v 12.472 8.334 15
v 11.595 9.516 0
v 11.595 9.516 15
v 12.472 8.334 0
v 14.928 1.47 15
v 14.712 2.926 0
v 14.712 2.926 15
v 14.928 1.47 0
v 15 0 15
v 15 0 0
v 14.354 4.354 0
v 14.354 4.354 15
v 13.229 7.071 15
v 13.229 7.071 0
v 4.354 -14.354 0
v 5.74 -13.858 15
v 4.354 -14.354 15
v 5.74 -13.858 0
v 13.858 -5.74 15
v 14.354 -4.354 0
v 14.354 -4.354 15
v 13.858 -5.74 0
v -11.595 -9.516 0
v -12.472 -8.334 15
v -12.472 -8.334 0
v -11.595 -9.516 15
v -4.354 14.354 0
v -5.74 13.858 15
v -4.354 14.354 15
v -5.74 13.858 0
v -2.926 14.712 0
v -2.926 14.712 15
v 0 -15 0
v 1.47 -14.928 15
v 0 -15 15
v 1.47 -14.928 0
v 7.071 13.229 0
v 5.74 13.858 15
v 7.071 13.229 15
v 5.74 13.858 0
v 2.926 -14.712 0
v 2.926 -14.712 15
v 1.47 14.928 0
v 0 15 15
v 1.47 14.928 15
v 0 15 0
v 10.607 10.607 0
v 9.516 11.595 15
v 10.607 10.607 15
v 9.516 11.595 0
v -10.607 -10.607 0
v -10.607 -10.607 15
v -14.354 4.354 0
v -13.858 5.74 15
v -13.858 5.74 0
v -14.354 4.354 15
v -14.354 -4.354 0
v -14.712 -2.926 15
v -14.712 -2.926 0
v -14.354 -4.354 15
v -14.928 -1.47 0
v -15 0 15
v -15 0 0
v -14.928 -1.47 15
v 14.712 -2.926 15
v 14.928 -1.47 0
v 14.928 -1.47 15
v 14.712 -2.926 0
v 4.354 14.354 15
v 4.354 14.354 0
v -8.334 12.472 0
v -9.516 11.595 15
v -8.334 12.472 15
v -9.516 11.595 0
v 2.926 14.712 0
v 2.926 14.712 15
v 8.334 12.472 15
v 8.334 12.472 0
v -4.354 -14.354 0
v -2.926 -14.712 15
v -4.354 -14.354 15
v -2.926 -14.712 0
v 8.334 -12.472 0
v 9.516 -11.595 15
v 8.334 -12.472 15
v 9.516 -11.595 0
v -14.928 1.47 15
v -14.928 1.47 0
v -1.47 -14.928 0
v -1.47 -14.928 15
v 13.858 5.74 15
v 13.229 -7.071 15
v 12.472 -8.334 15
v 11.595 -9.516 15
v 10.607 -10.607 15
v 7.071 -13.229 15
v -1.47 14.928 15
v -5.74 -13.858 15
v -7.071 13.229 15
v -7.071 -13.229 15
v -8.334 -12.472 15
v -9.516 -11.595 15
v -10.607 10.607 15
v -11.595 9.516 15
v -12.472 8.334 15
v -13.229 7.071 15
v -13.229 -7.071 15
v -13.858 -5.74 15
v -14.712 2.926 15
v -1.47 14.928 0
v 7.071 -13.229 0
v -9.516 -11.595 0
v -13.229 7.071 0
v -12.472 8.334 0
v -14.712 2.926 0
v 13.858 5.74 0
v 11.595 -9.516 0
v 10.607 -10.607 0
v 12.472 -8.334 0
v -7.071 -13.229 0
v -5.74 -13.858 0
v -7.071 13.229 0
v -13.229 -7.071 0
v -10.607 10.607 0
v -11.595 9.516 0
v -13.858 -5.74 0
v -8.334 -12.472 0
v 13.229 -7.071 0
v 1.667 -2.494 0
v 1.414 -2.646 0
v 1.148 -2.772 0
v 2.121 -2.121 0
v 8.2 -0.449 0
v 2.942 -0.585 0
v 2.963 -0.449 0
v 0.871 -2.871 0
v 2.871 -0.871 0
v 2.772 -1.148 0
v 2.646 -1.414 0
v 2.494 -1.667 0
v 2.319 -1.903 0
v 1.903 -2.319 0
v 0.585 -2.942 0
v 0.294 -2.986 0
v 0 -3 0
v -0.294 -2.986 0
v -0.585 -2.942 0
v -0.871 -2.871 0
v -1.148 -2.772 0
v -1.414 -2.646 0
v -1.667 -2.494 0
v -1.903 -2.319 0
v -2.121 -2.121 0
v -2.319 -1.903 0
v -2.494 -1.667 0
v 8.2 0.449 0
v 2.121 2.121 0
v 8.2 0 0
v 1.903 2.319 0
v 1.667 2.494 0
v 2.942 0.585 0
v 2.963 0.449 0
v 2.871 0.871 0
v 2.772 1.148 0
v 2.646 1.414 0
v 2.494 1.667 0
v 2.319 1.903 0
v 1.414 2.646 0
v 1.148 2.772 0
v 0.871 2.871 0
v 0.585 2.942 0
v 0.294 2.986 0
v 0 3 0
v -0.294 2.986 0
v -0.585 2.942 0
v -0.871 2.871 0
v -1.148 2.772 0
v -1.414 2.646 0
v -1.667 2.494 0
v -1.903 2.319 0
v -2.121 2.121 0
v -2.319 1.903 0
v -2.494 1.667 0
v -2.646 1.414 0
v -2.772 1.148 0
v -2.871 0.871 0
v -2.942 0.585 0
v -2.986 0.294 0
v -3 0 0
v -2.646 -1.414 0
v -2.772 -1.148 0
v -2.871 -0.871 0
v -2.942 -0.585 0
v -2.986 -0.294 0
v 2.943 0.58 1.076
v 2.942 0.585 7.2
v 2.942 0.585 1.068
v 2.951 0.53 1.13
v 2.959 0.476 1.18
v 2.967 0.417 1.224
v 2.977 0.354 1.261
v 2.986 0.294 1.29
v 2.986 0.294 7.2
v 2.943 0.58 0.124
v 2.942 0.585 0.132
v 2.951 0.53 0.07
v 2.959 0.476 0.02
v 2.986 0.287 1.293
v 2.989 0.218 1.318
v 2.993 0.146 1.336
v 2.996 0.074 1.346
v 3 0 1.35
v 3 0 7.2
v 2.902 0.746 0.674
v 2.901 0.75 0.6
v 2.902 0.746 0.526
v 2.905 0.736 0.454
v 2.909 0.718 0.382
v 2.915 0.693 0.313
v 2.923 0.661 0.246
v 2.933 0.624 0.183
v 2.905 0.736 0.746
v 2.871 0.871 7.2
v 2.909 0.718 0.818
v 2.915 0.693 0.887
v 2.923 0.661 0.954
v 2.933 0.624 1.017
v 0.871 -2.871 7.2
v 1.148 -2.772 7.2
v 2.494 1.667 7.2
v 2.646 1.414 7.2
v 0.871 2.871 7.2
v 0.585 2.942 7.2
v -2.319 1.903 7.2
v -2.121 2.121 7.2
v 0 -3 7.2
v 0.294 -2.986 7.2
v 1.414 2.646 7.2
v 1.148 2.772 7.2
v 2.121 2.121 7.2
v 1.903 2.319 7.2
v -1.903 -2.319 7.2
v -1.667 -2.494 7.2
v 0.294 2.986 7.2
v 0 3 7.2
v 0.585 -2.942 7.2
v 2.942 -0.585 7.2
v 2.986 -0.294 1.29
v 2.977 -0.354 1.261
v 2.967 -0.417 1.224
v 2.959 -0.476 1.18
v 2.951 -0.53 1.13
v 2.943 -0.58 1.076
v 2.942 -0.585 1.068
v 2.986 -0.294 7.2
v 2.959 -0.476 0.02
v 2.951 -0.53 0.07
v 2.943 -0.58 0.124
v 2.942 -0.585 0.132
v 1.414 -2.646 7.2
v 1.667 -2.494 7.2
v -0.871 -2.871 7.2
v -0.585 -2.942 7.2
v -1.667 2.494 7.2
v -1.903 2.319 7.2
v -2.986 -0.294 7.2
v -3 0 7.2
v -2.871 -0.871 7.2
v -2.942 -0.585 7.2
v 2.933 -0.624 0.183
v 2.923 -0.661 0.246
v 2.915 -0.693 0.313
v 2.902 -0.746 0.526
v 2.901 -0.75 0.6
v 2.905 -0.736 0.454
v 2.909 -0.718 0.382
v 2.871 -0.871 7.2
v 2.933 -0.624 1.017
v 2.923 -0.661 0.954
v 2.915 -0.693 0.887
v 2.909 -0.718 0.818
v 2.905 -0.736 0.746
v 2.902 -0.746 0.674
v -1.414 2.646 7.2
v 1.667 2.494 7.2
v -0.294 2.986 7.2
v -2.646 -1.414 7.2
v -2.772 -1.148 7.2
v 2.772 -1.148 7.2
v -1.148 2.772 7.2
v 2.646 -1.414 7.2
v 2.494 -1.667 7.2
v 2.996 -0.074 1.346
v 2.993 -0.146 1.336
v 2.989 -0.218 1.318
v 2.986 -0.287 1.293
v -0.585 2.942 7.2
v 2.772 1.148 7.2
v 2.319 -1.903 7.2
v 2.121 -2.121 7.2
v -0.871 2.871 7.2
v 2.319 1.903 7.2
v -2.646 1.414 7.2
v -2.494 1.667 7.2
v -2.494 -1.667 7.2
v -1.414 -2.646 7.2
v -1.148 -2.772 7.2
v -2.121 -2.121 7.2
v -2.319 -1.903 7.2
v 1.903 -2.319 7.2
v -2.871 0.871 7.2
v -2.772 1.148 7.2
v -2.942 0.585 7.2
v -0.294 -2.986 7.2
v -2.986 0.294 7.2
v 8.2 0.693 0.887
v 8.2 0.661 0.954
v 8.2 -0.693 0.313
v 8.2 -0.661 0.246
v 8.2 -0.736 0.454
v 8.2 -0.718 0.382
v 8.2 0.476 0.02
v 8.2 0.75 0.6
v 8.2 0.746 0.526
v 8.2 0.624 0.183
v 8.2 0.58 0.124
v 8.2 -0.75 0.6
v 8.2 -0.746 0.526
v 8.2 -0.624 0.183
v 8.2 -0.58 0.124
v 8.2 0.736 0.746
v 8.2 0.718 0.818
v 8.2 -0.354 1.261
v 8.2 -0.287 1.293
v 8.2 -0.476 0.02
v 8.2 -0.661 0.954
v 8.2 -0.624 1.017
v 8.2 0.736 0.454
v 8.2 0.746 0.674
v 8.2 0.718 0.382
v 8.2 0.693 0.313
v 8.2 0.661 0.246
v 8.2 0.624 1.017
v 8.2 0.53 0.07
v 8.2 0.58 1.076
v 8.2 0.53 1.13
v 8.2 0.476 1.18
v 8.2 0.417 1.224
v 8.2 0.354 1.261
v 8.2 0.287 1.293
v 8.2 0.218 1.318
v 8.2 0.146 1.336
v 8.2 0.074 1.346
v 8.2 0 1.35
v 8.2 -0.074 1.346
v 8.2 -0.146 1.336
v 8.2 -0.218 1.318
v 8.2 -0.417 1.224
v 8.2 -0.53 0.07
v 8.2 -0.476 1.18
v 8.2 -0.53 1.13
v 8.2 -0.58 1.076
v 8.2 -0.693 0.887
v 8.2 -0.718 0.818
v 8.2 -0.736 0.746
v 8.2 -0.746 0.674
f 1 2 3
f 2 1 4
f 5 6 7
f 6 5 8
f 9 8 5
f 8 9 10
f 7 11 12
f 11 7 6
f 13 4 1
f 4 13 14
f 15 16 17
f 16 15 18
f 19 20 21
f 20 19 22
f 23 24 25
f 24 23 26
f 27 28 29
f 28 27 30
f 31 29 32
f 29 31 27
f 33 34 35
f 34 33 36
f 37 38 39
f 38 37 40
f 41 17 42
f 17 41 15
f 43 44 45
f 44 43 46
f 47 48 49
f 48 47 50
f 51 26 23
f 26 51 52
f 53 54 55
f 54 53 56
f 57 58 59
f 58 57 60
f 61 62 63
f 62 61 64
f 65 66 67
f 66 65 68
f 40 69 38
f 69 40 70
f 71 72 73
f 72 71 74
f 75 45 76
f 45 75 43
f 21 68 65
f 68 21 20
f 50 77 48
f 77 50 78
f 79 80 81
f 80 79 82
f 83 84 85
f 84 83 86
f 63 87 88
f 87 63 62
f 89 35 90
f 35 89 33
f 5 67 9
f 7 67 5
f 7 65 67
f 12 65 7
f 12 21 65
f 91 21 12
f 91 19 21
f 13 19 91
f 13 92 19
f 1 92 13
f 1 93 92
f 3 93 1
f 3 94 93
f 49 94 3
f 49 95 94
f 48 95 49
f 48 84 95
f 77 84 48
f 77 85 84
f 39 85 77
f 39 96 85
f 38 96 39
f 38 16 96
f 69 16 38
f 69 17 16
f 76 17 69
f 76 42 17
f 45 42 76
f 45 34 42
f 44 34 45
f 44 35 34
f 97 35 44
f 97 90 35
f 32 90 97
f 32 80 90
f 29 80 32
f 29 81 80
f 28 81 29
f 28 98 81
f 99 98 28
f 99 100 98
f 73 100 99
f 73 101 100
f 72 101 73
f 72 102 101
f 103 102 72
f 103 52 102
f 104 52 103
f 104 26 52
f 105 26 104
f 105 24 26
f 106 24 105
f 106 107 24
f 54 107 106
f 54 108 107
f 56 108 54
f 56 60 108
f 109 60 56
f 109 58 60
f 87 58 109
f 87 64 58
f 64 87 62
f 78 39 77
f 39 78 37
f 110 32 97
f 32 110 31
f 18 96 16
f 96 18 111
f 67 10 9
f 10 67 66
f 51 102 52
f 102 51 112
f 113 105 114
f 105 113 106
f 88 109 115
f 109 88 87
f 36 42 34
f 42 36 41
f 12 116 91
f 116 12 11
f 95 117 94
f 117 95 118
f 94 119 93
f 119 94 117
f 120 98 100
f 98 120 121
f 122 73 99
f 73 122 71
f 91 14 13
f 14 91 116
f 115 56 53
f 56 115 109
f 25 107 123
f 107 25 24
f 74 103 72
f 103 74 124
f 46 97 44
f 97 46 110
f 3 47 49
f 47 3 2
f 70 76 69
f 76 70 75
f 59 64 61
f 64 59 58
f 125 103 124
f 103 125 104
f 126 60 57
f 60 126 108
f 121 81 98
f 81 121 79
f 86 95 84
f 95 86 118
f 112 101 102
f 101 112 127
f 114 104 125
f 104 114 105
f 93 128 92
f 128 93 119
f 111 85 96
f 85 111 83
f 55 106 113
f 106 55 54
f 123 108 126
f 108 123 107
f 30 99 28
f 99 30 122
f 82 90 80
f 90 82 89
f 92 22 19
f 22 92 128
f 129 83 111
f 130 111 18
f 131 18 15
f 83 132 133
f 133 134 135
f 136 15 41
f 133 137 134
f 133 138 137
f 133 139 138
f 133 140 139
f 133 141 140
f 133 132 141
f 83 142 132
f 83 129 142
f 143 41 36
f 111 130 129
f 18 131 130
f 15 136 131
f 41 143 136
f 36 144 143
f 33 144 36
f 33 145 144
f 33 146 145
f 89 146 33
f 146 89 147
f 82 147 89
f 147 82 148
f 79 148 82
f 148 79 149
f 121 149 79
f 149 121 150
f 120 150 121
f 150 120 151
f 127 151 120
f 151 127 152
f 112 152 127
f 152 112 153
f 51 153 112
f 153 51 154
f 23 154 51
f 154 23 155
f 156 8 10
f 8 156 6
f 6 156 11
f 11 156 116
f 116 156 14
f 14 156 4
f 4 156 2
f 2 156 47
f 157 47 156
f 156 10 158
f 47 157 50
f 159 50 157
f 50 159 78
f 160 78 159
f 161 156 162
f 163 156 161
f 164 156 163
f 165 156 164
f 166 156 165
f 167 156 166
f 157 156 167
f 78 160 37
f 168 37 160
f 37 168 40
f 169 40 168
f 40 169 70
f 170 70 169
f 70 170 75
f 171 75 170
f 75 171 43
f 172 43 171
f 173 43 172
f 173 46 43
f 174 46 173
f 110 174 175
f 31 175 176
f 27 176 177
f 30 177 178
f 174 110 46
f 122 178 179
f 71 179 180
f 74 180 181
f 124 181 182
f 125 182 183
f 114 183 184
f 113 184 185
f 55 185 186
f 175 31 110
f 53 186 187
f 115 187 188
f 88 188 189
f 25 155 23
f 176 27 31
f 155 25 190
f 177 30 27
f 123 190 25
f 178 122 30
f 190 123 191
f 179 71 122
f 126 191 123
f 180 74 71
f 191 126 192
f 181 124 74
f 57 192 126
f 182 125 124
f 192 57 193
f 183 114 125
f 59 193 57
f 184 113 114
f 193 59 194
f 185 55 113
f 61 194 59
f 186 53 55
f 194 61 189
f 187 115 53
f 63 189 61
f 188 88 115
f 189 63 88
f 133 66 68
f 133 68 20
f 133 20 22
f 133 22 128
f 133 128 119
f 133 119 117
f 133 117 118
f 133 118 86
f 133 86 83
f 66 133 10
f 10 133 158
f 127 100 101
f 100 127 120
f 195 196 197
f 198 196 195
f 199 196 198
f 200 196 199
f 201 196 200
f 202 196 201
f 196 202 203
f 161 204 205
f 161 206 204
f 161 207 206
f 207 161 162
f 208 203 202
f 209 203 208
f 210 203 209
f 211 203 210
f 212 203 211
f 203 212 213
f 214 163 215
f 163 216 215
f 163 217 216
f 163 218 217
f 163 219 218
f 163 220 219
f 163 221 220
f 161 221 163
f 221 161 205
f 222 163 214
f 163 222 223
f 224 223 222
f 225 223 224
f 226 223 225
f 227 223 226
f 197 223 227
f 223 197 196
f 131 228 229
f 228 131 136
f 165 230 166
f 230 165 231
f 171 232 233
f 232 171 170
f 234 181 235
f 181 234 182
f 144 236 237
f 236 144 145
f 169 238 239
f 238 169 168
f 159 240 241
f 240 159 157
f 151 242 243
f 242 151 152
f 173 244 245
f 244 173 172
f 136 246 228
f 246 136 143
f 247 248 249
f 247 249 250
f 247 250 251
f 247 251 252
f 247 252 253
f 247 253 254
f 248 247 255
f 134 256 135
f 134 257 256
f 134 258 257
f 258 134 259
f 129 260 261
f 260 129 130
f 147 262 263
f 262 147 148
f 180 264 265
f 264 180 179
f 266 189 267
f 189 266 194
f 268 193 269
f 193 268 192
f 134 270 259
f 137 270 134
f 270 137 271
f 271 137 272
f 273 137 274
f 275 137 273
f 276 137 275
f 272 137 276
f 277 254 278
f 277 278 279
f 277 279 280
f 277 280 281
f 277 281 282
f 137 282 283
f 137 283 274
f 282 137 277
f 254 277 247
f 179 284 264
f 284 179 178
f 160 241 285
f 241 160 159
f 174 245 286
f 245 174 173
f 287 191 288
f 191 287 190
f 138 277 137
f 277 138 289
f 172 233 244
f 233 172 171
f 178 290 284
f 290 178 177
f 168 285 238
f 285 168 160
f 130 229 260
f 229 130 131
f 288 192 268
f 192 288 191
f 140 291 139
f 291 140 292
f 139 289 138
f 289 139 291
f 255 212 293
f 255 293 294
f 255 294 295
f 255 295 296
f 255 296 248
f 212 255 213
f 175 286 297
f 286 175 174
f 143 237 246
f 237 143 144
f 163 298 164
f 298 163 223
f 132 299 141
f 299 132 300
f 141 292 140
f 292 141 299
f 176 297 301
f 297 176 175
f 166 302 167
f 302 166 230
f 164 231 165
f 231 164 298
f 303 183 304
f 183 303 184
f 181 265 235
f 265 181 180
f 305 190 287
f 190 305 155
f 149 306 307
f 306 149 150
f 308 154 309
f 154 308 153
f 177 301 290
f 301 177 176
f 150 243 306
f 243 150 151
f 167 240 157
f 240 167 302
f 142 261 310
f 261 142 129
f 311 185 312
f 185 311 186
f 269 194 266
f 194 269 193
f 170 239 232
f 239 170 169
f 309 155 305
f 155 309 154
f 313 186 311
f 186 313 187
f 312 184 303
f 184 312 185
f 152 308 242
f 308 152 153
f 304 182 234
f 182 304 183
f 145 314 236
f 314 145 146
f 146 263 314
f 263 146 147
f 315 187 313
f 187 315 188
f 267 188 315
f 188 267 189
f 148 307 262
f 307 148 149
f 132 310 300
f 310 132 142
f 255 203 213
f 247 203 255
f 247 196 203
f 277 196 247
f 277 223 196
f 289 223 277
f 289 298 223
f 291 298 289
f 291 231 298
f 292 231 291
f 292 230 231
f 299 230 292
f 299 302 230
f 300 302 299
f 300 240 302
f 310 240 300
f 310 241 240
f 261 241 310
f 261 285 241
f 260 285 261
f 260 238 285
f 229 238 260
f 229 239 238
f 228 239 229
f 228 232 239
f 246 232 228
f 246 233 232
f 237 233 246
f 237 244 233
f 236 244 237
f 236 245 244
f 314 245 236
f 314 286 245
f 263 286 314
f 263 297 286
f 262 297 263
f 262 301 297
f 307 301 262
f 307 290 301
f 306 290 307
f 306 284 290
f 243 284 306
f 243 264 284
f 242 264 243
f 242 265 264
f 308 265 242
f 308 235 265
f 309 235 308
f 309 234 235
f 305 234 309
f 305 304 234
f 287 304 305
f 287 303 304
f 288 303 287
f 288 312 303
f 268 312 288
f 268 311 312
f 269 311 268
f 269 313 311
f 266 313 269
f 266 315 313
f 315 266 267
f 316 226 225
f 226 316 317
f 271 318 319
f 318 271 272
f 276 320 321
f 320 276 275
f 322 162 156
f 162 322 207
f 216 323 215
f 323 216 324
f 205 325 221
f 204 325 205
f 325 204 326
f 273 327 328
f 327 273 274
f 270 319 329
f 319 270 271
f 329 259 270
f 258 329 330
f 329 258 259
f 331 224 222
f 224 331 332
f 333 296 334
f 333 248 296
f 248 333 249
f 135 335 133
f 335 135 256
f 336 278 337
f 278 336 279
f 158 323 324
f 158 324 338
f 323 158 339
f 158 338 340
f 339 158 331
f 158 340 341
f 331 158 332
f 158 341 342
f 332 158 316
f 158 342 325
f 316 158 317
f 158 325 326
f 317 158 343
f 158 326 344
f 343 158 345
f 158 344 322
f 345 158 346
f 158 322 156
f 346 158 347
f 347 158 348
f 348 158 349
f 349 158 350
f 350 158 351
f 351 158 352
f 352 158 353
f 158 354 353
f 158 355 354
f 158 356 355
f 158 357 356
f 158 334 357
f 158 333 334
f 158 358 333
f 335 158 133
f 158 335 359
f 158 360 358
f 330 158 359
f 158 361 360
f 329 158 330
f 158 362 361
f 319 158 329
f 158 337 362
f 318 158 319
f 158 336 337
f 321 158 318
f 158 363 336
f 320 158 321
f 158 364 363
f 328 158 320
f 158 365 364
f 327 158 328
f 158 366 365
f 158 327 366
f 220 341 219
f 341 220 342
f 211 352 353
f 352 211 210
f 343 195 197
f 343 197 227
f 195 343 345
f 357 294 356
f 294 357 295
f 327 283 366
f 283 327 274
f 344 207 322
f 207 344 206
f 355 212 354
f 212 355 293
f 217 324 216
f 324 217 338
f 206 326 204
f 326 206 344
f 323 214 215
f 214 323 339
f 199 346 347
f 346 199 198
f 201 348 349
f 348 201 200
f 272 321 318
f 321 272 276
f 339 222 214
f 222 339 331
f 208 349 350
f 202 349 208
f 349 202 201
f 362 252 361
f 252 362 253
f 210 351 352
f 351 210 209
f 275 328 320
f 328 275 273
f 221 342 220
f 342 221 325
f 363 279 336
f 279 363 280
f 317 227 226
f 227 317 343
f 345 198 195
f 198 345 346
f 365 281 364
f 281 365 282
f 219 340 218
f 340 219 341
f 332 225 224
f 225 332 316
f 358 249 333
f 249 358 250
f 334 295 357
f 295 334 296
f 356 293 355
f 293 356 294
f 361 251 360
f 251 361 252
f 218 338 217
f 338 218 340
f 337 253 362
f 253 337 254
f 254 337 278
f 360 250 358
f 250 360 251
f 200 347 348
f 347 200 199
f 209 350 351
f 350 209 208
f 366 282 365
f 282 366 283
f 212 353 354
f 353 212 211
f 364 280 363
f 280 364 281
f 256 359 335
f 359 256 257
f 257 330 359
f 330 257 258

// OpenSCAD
// Replacement knob for a hotplate stirrer - a cylinder with a D-shaped shaft bore and an
// external grip grooved surface. NOVEL general part.
//

shaft_d   = 6;
knob_d    = 30;
knob_h    = 15;
bore_d    = 6.2;
grooves   = 18;
pointer_w = 1.5;

$fn = 64;

difference() {
    cylinder(h = knob_h, d = knob_d);

    for (i = [0 : grooves - 1])
        translate([0, 0, -1])
            rotate([0, 90, 0])
                cylinder(h = knob_h + 2, d = 2);

    translate([0, 0, -1])
        cylinder(h = bore_d + 2, d = shaft_d);

    translate([0, 0, -1])
        rotate([0, 90, 0])
            translate([-(bore_d / 2 - 1.5), 0, 0])
                cylinder(h = bore_d + 2, d = pointer_w);
}
